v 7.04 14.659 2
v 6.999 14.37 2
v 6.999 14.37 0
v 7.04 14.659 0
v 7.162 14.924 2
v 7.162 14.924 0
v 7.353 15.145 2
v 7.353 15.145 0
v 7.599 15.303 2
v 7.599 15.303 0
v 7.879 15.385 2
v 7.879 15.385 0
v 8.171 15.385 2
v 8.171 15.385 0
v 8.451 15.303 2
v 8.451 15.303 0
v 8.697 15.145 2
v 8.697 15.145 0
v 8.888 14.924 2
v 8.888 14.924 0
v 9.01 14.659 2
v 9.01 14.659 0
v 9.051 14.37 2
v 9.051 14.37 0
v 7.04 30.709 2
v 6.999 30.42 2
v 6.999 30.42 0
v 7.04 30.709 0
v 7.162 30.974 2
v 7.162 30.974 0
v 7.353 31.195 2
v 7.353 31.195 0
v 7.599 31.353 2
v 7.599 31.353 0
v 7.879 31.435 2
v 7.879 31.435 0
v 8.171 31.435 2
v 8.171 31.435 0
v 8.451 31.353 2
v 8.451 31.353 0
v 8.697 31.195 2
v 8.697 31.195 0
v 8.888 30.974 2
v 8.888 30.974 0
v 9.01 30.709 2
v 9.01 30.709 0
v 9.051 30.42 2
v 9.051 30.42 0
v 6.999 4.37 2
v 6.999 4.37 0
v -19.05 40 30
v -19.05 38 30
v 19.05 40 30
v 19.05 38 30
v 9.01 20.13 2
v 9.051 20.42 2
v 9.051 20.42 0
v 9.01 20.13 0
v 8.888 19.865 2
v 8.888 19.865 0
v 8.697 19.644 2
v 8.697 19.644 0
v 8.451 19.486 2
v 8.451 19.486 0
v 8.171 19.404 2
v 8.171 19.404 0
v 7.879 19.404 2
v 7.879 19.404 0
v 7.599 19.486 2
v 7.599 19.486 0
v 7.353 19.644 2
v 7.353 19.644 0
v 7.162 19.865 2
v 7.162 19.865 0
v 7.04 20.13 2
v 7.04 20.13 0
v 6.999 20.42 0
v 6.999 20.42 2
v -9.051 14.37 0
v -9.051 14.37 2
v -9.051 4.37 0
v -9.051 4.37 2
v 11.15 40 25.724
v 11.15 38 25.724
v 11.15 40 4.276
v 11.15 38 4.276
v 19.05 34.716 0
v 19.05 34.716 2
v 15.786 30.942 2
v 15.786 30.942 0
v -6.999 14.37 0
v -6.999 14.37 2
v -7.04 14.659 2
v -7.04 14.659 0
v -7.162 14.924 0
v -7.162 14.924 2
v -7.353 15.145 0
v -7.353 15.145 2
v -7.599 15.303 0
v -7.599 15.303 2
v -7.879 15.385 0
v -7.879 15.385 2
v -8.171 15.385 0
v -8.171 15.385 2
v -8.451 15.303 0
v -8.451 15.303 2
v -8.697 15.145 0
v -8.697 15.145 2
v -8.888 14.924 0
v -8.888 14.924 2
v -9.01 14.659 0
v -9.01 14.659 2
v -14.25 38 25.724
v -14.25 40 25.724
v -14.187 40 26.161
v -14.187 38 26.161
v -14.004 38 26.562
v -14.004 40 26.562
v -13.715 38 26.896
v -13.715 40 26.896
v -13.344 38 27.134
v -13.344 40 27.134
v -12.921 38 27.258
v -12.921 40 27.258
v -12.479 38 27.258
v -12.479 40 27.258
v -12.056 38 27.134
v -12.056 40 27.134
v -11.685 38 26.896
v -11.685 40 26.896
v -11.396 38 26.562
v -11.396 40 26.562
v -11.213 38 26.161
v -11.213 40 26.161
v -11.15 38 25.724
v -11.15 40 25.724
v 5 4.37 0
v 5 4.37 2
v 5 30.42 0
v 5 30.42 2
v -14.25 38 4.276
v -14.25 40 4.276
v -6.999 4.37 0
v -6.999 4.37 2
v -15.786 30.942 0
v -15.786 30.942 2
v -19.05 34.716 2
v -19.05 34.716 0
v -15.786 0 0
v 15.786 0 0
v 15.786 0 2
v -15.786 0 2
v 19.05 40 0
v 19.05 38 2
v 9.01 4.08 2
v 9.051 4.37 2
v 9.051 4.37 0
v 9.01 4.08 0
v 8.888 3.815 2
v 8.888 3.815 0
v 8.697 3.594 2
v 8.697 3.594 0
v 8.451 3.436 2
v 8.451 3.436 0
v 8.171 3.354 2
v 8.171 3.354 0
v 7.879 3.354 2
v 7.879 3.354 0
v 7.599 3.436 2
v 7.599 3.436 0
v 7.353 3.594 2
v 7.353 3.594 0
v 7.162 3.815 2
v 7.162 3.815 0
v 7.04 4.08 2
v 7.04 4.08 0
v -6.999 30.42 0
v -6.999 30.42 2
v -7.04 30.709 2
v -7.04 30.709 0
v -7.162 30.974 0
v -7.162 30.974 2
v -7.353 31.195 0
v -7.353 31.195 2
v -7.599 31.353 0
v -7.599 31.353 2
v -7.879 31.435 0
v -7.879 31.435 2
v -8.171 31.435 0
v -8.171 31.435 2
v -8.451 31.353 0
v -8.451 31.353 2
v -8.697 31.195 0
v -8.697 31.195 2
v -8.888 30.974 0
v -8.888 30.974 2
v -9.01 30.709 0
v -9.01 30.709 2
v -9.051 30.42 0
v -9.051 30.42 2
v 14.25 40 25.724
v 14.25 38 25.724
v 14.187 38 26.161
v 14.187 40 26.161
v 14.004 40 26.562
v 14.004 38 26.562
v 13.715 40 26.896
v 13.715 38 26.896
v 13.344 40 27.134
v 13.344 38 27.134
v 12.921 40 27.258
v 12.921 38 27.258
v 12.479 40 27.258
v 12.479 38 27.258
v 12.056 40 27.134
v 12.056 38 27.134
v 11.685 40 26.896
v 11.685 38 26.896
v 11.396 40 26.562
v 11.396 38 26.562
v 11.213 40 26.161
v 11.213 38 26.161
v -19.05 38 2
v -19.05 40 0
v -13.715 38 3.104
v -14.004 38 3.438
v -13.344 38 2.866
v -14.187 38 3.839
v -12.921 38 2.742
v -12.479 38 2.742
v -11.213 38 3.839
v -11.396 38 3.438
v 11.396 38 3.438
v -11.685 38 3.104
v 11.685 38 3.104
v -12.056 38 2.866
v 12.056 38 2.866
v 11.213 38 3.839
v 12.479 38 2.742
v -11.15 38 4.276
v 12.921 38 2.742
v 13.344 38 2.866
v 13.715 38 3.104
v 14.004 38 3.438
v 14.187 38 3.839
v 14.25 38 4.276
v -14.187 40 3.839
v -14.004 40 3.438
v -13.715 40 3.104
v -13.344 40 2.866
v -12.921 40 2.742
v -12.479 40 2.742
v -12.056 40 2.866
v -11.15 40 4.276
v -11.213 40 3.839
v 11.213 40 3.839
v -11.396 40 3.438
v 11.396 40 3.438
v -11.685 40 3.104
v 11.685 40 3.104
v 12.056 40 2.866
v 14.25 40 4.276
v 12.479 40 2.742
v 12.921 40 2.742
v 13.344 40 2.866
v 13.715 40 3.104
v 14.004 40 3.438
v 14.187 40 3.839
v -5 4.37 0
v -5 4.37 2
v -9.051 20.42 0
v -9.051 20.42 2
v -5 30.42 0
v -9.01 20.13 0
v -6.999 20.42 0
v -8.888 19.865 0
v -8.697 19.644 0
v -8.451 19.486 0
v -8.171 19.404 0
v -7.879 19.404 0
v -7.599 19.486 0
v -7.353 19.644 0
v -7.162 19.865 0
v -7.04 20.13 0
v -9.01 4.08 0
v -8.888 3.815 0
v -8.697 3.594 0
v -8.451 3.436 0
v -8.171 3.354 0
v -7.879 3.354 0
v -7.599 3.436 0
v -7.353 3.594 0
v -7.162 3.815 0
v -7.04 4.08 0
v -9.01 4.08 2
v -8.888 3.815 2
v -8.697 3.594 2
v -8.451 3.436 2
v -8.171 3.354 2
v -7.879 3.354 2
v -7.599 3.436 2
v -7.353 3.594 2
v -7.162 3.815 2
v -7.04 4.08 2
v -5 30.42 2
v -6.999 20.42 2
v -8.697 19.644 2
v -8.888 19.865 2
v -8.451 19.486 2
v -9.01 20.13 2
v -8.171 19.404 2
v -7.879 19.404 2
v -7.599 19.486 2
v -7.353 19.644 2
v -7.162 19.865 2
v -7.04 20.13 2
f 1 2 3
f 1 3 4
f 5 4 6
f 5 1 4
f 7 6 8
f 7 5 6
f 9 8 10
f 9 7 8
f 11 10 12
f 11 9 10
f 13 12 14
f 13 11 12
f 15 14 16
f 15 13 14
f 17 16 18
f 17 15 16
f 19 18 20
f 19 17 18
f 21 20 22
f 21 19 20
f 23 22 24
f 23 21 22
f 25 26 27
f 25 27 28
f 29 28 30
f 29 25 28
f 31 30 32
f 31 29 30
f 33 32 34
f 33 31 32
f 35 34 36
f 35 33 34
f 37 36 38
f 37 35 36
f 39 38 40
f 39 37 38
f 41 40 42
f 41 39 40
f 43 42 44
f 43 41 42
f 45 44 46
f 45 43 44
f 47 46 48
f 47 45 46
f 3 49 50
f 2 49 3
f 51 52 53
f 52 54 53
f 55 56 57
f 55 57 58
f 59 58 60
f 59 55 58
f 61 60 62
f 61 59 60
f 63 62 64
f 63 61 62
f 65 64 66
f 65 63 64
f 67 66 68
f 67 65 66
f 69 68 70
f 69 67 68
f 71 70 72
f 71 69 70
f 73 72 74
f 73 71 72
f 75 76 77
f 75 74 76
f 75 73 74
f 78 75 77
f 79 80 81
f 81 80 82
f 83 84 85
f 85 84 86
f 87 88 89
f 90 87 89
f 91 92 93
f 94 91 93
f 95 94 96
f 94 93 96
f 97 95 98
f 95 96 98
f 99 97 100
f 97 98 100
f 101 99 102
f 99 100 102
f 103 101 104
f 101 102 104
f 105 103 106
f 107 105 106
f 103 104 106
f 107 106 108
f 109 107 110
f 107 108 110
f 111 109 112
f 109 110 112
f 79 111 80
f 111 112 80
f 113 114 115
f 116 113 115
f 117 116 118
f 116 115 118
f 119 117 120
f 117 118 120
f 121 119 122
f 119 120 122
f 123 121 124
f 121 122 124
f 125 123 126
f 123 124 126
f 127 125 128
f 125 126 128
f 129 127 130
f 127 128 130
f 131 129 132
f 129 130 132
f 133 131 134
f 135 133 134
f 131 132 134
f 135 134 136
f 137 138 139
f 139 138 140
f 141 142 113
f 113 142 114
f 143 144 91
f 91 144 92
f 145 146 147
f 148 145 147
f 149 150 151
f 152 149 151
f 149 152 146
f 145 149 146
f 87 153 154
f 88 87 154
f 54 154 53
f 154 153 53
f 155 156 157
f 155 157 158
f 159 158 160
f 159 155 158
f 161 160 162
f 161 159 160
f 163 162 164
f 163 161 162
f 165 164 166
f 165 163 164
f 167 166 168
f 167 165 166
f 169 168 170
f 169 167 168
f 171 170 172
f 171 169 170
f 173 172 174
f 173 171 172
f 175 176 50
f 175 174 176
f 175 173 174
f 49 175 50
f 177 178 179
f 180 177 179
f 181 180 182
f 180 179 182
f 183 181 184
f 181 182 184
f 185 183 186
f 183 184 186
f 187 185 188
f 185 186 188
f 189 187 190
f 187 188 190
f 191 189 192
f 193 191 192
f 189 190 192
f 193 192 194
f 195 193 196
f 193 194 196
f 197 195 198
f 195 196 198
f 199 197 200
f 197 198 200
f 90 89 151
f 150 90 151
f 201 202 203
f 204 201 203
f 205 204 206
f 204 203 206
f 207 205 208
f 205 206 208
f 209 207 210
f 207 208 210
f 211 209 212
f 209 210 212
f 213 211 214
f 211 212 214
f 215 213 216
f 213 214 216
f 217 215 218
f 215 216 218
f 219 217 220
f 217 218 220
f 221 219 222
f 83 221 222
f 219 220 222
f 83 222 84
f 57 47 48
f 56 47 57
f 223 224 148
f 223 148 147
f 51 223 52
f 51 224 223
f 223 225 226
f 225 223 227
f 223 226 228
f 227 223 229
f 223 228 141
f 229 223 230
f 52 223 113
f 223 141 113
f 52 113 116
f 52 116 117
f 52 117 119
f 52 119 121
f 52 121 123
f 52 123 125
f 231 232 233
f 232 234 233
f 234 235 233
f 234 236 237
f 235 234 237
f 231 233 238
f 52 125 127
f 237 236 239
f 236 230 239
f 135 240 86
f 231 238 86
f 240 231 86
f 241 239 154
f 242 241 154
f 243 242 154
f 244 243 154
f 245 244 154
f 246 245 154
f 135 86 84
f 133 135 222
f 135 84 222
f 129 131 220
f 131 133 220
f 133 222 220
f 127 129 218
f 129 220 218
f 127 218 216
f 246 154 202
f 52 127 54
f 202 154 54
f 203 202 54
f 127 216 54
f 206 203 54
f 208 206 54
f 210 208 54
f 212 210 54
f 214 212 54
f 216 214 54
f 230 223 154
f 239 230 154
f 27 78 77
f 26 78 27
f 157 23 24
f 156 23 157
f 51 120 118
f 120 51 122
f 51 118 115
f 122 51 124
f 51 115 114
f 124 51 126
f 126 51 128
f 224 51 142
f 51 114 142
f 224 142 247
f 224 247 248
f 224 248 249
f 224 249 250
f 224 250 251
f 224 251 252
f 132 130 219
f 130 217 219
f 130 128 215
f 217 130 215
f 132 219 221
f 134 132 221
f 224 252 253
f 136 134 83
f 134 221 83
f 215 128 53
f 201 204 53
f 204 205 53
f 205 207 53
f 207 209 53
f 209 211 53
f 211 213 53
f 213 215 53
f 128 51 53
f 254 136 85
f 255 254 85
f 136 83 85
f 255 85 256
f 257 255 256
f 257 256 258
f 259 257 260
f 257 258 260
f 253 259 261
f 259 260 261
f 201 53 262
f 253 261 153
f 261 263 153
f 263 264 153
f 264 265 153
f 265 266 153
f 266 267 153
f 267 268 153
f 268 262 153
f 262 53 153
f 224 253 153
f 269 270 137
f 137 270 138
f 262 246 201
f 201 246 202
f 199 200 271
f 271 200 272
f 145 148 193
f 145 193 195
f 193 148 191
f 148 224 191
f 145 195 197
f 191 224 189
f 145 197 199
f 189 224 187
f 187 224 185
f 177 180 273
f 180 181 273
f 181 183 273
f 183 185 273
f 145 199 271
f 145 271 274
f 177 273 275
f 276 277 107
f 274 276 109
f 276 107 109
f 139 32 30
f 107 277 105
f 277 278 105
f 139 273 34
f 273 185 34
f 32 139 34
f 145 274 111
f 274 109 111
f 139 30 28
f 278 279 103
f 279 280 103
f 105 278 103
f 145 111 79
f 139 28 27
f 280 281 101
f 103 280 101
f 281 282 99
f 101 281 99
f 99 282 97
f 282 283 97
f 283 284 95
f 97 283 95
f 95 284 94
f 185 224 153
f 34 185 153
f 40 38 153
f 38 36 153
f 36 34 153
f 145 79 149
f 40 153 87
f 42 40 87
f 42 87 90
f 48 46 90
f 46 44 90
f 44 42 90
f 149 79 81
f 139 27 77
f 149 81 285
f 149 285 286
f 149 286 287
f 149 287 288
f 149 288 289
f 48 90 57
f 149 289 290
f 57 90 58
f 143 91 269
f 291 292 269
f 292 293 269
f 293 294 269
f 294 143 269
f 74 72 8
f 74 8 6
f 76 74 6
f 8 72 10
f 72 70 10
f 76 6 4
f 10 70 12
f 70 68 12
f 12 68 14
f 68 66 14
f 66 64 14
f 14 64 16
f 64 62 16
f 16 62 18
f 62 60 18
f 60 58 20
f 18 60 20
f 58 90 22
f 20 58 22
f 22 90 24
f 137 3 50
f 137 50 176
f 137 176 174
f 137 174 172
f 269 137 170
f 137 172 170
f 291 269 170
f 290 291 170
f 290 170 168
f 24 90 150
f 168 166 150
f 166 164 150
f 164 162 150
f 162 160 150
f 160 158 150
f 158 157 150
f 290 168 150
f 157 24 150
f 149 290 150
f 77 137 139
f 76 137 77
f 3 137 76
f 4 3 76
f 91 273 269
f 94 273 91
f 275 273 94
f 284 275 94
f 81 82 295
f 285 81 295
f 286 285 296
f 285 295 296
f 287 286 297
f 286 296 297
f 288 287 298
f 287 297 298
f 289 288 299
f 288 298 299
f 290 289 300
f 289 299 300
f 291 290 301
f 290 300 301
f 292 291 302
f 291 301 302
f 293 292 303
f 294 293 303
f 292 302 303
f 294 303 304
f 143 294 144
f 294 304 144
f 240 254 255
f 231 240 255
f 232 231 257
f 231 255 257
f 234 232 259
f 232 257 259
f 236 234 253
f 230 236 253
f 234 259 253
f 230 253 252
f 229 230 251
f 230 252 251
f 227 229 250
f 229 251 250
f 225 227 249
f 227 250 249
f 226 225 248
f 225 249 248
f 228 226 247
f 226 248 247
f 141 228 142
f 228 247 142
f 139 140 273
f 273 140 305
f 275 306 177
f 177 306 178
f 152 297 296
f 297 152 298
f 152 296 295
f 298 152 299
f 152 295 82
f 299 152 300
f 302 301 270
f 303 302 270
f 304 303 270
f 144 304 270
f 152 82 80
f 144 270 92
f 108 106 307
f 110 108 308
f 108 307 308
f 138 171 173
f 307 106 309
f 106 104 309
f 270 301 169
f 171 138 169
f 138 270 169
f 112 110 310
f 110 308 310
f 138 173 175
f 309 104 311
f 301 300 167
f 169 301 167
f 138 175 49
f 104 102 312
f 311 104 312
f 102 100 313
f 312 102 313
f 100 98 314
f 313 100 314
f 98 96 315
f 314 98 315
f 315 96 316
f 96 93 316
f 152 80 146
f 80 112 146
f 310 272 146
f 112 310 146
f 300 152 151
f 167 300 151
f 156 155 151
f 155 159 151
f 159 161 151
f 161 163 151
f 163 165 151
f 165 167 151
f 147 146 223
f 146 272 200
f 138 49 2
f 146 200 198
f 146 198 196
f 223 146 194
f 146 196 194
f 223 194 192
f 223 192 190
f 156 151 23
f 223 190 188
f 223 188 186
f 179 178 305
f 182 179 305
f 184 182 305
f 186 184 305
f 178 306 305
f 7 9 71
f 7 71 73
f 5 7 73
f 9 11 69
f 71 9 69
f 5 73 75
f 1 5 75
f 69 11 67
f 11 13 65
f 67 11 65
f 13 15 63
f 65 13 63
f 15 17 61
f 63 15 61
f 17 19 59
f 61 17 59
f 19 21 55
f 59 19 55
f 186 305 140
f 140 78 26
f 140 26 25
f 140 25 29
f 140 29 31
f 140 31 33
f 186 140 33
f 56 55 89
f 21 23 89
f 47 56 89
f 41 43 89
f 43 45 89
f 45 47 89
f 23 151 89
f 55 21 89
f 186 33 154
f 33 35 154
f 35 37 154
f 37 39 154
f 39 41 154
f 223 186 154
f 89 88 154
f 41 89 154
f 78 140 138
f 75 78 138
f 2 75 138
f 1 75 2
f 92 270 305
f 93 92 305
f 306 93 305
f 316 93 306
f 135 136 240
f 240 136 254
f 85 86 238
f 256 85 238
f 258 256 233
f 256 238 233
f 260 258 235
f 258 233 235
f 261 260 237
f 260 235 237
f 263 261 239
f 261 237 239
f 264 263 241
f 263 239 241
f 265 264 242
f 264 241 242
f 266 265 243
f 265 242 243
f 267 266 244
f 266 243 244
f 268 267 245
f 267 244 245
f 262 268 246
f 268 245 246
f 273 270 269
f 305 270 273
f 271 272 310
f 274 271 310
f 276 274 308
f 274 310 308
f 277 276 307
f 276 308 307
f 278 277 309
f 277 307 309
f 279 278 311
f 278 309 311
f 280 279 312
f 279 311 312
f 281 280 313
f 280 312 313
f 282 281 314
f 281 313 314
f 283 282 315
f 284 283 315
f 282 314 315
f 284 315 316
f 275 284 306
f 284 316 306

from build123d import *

# Parameters (mm, degrees)
BOSS_EXTRUDE1_DEPTH = 19.05
CUT_EXTRUDE1_DEPTH  = 19.05
SKETCH3_W           = 5
SKETCH3_H           = 26.05
CUT_EXTRUDE2_DEPTH  = 3


with BuildPart() as part:
    # Sketch1 → Boss-Extrude1 (new body, symmetric)
    with BuildSketch(Plane(origin=(0, 0, 0), x_dir=(0, 0, -1), z_dir=(1, 0, 0))):
        Polygon((0, 0), (-2, 0), (-2, 38), (-30, 38), (-30, 40), (0, 40), align=None)
    extrude(amount=BOSS_EXTRUDE1_DEPTH, both=True)

    # Sketch2 → Cut-Extrude1 (cut, symmetric)
    with BuildSketch(Plane(origin=(0, 40, 0), x_dir=(1, 0, 0), z_dir=(0, 1, 0))):
        with BuildLine():
            Line((11.15, -25.724165568), (11.15, -4.275834432))
            ThreePointArc((11.15, -4.275834432), (12.7, -2.725834432), (14.25, -4.275834432))
            Line((14.25, -4.275834432), (14.25, -25.724165568))
            ThreePointArc((14.25, -25.724165568), (12.7, -27.274165568), (11.15, -25.724165568))
        make_face()
        with BuildLine():
            Line((-11.15, -25.724165568), (-11.15, -4.275834432))
            ThreePointArc((-11.15, -4.275834432), (-12.7, -2.725834432), (-14.25, -4.275834432))
            Line((-14.25, -4.275834432), (-14.25, -25.724165568))
            ThreePointArc((-14.25, -25.724165568), (-12.7, -27.274165568), (-11.15, -25.724165568))
        make_face()
    extrude(amount=CUT_EXTRUDE1_DEPTH, both=True, mode=Mode.SUBTRACT)

    # Sketch3 → Cut-Extrude2 (cut, through all)
    with BuildSketch(Plane.XY.offset(2)):
        with Locations((2.5, 17.394531681)):
            Rectangle(SKETCH3_W, SKETCH3_H)
        with Locations((-2.5, 17.394531681)):
            Rectangle(SKETCH3_W, SKETCH3_H)
        with BuildLine():
            Line((-9.051280256, 30.419531681), (-9.051280256, 20.419531681))
            ThreePointArc((-9.051280256, 20.419531681), (-8.025, 19.393251425), (-6.998719744, 20.419531681))
            Line((-6.998719744, 20.419531681), (-6.998719744, 30.419531681))
            ThreePointArc((-6.998719744, 30.419531681), (-8.025, 31.445811938), (-9.051280256, 30.419531681))
        make_face()
        with BuildLine():
            Line((-9.051280256, 14.369531681), (-9.051280256, 4.369531681))
            ThreePointArc((-9.051280256, 4.369531681), (-8.025, 3.343251425), (-6.998719744, 4.369531681))
            Line((-6.998719744, 4.369531681), (-6.998719744, 14.369531681))
            ThreePointArc((-6.998719744, 14.369531681), (-8.025, 15.395811938), (-9.051280256, 14.369531681))
        make_face()
        with BuildLine():
            ThreePointArc((9.051280256, 20.419531681), (8.025, 19.393251425), (6.998719744, 20.419531681))
            Line((6.998719744, 20.419531681), (6.998719744, 30.419531681))
            ThreePointArc((6.998719744, 30.419531681), (8.025, 31.445811938), (9.051280256, 30.419531681))
            Line((9.051280256, 30.419531681), (9.051280256, 20.419531681))
        make_face()
        with BuildLine():
            ThreePointArc((9.051280256, 4.369531681), (8.025, 3.343251425), (6.998719744, 4.369531681))
            Line((6.998719744, 4.369531681), (6.998719744, 14.369531681))
            ThreePointArc((6.998719744, 14.369531681), (8.025, 15.395811938), (9.051280256, 14.369531681))
            Line((9.051280256, 14.369531681), (9.051280256, 4.369531681))
        make_face()
        Polygon((-15.786412439, 30.942427664), (-19.05, 34.716026675), (-19.05, 0), (-15.786412439, 0), align=None)
        Polygon((15.786412439, 30.942427664), (15.786412439, 0), (19.05, 0), (19.05, 34.716026675), align=None)
    extrude(amount=-CUT_EXTRUDE2_DEPTH, mode=Mode.SUBTRACT)


solid = part.part
